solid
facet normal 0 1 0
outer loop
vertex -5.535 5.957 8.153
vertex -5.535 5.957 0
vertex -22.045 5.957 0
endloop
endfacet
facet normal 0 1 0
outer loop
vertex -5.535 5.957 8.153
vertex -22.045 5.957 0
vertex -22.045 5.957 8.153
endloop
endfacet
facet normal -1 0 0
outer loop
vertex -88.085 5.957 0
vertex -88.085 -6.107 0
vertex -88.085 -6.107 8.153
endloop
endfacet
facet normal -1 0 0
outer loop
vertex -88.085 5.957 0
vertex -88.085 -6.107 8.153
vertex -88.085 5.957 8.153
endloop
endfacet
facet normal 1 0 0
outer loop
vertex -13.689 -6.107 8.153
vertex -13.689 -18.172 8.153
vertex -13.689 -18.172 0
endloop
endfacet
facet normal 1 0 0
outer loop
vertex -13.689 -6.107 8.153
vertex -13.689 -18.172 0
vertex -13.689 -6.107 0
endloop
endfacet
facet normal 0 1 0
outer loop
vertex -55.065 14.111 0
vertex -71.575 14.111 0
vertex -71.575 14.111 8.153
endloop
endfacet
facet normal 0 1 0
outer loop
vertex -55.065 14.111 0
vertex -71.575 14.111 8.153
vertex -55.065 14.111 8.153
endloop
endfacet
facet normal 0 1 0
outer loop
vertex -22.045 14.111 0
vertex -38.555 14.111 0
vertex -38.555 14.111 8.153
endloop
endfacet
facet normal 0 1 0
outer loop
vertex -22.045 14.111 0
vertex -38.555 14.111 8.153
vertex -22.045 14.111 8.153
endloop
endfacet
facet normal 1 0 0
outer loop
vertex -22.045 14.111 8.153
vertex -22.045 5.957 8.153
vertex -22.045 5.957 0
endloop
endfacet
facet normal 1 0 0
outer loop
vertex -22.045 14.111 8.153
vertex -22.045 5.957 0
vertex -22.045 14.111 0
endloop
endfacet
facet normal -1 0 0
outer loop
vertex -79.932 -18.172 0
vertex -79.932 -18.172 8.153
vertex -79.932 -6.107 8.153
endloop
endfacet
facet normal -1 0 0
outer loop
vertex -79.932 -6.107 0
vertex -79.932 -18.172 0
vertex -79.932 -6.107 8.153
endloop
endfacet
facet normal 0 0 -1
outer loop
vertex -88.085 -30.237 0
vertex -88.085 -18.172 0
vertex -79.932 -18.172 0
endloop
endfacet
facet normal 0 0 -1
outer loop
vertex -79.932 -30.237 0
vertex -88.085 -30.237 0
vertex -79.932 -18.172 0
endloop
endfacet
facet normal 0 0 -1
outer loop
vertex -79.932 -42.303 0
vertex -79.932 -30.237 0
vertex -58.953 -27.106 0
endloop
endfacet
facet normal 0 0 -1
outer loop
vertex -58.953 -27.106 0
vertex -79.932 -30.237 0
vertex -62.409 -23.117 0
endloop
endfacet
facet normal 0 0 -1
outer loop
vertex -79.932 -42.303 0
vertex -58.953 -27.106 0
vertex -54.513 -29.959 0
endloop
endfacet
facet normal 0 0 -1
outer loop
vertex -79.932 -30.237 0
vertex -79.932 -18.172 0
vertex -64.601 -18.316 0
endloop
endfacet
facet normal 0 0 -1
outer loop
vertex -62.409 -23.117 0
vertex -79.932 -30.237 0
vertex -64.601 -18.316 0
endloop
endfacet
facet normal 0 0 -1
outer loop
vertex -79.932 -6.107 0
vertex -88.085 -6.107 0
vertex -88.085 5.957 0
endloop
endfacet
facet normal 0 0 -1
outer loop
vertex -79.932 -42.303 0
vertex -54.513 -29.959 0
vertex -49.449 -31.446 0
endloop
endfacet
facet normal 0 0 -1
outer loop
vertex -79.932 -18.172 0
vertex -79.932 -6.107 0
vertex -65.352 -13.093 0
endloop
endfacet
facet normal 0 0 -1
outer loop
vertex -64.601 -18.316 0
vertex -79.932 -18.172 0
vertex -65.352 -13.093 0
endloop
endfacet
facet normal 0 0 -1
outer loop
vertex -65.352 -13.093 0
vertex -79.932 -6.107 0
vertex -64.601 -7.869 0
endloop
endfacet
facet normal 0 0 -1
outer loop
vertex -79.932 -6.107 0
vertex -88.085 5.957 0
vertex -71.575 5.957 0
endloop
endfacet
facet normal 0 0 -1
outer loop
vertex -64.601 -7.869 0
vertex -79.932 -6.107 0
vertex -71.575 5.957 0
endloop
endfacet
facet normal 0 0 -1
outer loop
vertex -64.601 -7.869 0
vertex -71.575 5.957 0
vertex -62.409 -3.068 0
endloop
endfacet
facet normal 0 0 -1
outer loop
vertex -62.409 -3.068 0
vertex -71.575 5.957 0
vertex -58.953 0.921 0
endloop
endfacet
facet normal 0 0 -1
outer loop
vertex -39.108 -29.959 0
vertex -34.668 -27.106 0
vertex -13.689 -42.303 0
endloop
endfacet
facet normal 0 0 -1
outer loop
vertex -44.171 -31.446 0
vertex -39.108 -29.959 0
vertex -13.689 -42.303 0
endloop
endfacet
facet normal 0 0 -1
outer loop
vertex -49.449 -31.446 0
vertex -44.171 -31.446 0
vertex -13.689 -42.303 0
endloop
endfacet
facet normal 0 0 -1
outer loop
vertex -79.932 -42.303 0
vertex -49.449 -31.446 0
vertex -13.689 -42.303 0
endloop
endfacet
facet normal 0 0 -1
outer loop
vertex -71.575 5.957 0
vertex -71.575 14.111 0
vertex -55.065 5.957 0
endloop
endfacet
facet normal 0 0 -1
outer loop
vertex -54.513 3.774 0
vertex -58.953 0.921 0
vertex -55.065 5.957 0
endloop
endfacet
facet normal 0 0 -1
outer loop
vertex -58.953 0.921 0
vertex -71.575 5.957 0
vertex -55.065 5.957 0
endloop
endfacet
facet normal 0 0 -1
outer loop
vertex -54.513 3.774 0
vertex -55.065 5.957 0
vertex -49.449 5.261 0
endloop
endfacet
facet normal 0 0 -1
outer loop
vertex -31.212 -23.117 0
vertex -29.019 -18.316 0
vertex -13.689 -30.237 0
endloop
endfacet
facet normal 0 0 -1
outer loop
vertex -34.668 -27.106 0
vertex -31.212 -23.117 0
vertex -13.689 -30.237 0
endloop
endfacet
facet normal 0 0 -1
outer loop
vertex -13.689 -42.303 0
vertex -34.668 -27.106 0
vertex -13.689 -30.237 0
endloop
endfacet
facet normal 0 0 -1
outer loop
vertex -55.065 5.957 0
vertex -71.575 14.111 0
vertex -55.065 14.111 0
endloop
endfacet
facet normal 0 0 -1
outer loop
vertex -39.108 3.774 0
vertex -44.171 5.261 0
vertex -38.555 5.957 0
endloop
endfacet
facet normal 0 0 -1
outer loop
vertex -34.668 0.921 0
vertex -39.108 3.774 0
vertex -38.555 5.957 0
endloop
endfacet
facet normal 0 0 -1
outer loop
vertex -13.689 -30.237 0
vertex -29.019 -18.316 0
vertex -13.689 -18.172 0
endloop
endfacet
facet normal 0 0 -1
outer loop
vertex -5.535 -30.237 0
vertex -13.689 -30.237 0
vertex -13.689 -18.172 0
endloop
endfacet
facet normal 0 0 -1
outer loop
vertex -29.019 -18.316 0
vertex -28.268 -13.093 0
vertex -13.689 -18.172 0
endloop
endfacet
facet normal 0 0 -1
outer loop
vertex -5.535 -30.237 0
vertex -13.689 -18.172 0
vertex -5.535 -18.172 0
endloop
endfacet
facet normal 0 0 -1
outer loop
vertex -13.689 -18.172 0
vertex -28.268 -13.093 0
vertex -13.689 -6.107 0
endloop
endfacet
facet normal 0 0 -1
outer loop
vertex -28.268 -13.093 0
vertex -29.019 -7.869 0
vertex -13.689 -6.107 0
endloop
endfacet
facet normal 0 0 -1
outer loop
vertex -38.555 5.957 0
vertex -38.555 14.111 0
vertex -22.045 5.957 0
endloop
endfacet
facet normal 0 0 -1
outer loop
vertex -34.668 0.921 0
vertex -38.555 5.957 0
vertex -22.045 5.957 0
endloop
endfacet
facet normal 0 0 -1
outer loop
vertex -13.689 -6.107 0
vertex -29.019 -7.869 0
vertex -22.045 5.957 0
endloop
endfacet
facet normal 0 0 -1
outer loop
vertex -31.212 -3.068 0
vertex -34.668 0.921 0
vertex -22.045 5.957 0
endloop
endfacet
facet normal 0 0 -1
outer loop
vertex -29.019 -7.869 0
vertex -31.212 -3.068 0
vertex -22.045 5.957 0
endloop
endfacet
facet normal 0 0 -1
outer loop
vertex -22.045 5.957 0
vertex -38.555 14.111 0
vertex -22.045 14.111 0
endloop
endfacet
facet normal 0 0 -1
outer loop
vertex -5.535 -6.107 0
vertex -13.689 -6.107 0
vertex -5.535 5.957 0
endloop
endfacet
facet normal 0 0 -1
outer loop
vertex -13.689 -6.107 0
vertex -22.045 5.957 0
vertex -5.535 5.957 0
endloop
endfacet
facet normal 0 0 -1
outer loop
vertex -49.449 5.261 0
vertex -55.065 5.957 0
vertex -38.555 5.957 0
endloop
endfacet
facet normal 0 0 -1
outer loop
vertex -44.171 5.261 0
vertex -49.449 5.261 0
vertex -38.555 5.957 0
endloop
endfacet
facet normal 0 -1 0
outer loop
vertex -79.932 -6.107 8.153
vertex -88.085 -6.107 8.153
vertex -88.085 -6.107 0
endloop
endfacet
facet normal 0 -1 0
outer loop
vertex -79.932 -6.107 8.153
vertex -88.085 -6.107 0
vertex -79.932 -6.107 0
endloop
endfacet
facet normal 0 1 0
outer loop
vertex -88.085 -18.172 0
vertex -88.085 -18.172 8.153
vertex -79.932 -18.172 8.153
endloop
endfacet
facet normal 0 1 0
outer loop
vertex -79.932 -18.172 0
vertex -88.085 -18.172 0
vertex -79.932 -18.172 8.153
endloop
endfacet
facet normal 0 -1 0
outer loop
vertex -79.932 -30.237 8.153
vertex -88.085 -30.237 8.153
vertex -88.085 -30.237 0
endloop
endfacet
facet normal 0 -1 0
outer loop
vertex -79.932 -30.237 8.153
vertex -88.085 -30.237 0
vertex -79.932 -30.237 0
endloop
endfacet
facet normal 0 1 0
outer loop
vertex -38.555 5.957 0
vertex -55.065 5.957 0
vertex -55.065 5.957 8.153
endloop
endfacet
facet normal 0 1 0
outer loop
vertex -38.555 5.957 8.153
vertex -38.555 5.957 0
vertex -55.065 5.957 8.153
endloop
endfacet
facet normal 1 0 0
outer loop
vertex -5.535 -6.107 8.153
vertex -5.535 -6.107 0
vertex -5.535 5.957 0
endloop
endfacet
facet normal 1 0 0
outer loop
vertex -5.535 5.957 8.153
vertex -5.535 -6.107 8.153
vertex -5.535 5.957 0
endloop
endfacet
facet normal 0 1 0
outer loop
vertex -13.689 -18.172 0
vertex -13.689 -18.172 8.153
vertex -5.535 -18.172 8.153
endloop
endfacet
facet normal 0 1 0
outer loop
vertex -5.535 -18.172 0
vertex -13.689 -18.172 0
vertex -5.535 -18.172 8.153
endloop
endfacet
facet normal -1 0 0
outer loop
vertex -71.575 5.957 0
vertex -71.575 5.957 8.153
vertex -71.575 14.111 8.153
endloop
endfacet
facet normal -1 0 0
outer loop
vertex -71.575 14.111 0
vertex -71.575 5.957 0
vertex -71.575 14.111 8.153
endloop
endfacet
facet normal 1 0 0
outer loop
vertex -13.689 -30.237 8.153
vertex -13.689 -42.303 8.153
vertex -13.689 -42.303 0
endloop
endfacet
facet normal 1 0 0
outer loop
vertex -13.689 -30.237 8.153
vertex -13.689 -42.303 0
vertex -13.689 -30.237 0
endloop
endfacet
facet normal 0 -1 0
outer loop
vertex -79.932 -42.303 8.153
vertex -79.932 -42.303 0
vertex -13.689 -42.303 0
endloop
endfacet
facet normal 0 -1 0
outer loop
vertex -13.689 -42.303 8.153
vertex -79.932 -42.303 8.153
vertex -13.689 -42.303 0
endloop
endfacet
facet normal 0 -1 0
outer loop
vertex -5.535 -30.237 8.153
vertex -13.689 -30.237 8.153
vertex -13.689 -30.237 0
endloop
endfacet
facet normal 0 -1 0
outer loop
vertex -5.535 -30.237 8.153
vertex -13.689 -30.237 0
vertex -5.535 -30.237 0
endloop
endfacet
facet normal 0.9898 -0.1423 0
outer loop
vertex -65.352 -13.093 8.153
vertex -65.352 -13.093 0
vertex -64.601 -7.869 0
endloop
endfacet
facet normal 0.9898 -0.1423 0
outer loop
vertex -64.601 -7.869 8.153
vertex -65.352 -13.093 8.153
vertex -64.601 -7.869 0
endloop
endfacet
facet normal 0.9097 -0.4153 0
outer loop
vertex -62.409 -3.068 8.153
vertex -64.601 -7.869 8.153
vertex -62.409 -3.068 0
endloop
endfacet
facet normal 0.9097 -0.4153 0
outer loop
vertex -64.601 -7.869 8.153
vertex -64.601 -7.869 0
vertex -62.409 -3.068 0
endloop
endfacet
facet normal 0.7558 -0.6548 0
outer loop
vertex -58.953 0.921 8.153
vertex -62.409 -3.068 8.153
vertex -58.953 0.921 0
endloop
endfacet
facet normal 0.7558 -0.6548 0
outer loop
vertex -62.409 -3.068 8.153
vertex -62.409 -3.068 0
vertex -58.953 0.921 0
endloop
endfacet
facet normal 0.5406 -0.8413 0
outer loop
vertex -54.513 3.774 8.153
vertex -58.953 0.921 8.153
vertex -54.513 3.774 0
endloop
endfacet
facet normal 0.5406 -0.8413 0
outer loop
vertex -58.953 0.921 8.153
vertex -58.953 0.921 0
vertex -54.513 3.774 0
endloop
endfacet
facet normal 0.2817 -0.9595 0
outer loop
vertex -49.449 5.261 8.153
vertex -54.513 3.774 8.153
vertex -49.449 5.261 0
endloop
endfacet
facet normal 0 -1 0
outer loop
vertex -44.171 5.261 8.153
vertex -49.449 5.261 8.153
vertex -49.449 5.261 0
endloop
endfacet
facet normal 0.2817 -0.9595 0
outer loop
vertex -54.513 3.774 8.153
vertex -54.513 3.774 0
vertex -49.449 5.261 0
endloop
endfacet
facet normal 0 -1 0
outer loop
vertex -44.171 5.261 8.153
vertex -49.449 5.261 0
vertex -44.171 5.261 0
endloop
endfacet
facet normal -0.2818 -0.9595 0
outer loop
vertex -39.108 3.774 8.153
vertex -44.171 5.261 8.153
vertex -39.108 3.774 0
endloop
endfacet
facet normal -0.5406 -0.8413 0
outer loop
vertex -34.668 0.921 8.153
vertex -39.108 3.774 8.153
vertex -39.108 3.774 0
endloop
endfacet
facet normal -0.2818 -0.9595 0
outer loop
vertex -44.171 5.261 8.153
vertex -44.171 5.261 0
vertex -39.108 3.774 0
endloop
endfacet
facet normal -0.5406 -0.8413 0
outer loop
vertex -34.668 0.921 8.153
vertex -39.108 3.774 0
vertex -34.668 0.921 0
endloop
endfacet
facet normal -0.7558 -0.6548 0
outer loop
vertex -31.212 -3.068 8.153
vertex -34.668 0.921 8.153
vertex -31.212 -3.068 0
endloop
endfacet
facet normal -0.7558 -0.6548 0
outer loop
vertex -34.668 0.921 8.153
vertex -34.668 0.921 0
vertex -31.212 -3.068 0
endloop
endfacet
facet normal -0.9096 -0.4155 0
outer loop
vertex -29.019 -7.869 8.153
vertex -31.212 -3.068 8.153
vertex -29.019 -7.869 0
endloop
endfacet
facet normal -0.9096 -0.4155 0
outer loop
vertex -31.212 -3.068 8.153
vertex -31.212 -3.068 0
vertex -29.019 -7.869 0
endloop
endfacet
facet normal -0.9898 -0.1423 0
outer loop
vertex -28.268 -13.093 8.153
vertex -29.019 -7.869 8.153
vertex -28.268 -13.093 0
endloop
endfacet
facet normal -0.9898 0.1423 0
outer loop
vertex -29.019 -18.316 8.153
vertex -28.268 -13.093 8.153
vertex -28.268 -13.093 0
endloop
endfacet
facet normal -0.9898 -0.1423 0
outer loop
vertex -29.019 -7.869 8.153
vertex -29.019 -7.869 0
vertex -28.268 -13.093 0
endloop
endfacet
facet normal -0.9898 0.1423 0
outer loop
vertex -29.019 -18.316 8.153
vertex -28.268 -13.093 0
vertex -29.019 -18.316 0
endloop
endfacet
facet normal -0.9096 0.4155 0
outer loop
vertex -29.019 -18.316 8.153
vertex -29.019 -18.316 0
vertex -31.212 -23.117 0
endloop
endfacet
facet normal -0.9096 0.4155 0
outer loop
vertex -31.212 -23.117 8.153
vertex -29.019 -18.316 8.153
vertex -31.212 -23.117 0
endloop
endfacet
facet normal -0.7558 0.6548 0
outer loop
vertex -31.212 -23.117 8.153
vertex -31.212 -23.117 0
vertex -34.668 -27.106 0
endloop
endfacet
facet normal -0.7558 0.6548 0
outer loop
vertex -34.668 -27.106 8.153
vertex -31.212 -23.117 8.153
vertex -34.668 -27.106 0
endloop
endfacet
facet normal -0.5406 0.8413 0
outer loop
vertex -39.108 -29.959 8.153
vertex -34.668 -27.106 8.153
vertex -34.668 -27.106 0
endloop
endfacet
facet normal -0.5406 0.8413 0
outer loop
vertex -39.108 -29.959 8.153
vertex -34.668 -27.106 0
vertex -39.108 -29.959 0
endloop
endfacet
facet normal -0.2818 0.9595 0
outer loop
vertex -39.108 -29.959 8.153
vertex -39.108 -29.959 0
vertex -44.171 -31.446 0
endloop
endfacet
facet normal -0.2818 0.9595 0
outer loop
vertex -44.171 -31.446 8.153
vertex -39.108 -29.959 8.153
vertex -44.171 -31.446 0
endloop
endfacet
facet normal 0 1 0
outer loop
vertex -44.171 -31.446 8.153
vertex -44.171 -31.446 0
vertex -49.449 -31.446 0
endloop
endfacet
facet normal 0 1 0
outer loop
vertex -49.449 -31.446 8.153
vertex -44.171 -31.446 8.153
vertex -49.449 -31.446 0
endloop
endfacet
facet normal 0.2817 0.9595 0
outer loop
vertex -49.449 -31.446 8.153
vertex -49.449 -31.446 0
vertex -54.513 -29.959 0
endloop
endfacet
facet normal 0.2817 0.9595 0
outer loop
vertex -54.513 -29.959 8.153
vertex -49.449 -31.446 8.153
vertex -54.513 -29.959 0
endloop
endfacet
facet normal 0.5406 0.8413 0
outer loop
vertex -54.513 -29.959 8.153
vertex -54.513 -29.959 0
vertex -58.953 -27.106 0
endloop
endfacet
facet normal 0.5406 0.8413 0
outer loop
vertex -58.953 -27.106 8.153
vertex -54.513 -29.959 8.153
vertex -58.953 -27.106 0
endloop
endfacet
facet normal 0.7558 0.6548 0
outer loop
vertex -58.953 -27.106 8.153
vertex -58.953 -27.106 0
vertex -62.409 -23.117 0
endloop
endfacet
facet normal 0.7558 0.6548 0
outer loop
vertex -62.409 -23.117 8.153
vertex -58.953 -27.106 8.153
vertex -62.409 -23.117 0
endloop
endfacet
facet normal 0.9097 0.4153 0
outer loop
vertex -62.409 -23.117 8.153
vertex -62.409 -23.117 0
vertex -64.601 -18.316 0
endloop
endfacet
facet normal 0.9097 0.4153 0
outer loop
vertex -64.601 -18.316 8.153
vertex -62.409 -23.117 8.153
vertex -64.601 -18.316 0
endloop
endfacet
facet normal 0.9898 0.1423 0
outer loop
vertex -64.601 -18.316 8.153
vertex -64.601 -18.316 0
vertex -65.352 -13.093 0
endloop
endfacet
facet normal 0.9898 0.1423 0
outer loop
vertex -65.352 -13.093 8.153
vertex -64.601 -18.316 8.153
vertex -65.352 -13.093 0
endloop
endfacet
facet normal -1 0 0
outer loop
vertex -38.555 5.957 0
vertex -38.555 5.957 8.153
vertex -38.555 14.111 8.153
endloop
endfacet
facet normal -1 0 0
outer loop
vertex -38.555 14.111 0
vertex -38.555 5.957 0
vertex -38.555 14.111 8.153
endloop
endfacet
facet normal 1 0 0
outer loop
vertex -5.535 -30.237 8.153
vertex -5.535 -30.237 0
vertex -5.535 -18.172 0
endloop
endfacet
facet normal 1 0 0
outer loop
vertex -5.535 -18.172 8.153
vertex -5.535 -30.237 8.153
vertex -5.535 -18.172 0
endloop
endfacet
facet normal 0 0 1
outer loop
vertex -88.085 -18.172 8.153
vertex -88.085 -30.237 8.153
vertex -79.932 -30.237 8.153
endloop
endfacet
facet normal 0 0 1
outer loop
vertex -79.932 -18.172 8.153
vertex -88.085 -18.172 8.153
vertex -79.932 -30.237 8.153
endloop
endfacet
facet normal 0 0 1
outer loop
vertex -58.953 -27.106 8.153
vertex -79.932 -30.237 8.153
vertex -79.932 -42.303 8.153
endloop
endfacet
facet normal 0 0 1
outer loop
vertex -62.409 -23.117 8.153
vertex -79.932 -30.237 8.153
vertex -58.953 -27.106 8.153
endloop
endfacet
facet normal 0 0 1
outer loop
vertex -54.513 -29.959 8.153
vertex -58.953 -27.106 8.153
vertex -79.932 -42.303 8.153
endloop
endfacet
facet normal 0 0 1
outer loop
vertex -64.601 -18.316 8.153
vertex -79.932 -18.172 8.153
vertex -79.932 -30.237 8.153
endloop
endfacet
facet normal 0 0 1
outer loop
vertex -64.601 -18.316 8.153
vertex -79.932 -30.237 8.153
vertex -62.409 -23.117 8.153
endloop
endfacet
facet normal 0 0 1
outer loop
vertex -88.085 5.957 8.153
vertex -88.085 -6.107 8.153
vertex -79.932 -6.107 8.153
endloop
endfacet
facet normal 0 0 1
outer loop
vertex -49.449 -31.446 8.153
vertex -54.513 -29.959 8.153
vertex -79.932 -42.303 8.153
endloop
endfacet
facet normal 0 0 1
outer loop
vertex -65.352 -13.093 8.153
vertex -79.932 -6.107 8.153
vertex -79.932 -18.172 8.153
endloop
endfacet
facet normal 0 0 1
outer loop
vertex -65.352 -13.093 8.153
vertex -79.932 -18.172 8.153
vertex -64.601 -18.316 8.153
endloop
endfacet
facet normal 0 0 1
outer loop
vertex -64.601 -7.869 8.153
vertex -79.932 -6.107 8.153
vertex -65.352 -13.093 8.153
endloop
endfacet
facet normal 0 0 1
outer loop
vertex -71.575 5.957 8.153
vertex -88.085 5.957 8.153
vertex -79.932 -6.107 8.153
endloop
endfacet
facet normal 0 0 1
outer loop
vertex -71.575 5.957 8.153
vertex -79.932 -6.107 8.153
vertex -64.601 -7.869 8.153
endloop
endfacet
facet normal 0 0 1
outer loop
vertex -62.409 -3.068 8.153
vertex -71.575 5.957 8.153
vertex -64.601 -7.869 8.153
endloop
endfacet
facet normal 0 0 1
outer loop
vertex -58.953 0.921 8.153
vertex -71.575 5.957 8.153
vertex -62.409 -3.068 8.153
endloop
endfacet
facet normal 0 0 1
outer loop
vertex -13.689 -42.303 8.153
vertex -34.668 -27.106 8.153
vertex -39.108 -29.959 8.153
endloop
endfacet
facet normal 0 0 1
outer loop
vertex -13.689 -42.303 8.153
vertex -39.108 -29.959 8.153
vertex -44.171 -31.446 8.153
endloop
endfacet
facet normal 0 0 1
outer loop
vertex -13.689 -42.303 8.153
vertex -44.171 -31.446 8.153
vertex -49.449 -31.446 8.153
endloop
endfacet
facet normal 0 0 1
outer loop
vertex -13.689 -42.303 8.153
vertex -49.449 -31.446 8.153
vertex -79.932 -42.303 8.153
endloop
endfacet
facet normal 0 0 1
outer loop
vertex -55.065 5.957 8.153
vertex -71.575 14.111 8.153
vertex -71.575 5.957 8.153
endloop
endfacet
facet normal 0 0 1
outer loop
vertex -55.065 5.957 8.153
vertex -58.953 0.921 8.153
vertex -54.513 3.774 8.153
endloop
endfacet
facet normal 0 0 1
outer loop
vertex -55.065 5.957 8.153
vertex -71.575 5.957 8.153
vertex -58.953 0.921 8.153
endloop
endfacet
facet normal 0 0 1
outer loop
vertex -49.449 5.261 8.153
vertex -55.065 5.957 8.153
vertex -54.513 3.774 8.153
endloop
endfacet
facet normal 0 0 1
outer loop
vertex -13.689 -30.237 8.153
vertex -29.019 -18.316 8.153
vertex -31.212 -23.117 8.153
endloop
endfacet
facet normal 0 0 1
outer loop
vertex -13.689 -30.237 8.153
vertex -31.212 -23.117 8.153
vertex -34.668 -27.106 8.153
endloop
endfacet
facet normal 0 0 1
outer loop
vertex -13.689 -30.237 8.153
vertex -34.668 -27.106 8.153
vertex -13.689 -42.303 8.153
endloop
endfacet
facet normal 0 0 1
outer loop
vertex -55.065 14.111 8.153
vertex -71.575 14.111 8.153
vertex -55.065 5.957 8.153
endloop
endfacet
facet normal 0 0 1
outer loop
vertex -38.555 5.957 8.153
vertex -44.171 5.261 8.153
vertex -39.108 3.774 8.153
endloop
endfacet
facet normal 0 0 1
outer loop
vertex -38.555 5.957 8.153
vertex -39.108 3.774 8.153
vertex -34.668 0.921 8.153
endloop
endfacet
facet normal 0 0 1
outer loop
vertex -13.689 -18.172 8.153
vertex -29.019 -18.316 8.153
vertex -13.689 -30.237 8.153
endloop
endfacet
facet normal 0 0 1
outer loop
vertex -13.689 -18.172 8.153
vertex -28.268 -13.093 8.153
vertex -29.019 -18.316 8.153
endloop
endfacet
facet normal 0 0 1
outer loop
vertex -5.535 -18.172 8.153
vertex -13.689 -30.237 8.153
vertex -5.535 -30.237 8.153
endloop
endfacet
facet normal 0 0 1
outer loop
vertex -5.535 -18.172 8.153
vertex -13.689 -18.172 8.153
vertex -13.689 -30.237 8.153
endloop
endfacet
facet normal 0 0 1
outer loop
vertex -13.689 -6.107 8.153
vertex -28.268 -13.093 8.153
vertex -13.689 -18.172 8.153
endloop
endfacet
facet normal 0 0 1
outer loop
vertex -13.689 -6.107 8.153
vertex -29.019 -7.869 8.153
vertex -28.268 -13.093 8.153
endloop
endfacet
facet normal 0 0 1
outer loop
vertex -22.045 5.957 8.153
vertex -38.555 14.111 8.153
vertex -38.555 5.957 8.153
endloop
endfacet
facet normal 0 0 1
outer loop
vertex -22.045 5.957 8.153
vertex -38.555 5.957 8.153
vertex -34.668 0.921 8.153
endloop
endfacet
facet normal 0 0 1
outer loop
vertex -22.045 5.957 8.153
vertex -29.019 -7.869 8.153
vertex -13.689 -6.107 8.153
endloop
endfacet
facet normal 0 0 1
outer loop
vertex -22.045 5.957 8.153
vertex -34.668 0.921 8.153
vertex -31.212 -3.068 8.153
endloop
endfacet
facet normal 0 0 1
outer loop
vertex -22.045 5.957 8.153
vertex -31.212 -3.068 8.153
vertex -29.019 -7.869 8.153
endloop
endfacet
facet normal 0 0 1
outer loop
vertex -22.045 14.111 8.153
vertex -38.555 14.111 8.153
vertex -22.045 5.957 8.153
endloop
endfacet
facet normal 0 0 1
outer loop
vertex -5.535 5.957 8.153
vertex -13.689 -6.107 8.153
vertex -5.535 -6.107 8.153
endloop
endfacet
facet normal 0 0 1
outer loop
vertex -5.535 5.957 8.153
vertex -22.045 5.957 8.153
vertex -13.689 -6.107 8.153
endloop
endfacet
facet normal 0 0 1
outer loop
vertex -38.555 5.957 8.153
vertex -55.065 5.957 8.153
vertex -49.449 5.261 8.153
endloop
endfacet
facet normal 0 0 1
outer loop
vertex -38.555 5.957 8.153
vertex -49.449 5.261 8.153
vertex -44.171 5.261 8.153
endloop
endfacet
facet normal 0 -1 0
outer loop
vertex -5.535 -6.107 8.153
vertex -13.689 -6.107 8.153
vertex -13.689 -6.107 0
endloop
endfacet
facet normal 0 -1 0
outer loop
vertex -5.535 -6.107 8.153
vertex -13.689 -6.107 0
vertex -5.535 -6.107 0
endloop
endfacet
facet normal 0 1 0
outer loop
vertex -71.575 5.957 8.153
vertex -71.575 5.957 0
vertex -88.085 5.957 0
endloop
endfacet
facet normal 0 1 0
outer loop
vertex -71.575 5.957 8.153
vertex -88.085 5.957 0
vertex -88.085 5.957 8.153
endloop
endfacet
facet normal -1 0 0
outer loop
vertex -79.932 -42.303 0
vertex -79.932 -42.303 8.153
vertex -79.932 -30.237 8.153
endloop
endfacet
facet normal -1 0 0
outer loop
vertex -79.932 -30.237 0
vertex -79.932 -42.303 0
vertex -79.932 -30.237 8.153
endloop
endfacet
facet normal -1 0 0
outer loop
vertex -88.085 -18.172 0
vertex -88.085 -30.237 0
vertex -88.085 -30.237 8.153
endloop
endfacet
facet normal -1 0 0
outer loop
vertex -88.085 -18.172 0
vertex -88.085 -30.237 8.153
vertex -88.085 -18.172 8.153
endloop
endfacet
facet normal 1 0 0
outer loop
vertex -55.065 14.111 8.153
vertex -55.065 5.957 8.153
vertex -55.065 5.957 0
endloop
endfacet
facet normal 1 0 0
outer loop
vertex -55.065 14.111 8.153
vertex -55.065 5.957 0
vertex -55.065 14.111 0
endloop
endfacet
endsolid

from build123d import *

# Parameters (mm, degrees)
SKETCH1_W                = 82.55
SKETCH1_H                = 56.4134
BOSS_EXTRUDE1_DEPTH      = 8.1534
CUT_EXTRUDE1_START       = -88.085249325
CUT_EXTRUDE1_OUTLINE_W   = 8.1534
CUT_EXTRUDE1_OUTLINE_H   = 8.1534
CUT_EXTRUDE1_DEPTH       = 16.51
CUT_EXTRUDE1_START_2     = -55.065249325
CUT_EXTRUDE1_2_OUTLINE_W = 8.1534
CUT_EXTRUDE1_2_OUTLINE_H = 8.1534
CUT_EXTRUDE1_2_DEPTH     = 16.51
CUT_EXTRUDE1_START_3     = -22.045249325
CUT_EXTRUDE1_3_OUTLINE_W = 8.1534
CUT_EXTRUDE1_3_OUTLINE_H = 8.1534
CUT_EXTRUDE1_3_DEPTH     = 16.51
SKETCH3_W                = 8.1534
SKETCH3_H                = 12.065106948
CUT_EXTRUDE2_DEPTH       = 99.056076844
SKETCH4_R                = 18.542
CUT_EXTRUDE3_DEPTH       = 99.056076844


# Read off the part's stored shape, not the designer's step: Cut-Extrude1
with BuildPart() as part:
    # Sketch1 → Boss-Extrude1 (new body)
    with BuildSketch(Plane.XY):
        with Locations((-46.810249325, -14.095842782)):
            Rectangle(SKETCH1_W, SKETCH1_H)
    extrude(amount=BOSS_EXTRUDE1_DEPTH)

    # Cut-Extrude1 outline → Cut-Extrude1 (cut)
    with BuildSketch(Plane.YZ.offset(CUT_EXTRUDE1_START)):
        with Locations((10.034157218, 4.0767)):
            Rectangle(CUT_EXTRUDE1_OUTLINE_W, CUT_EXTRUDE1_OUTLINE_H)
    extrude(amount=CUT_EXTRUDE1_DEPTH, mode=Mode.SUBTRACT)

    # Cut-Extrude1 2 outline → Cut-Extrude1 2 (cut)
    with BuildSketch(Plane.YZ.offset(CUT_EXTRUDE1_START_2)):
        with Locations((10.034157218, 4.0767)):
            Rectangle(CUT_EXTRUDE1_2_OUTLINE_W, CUT_EXTRUDE1_2_OUTLINE_H)
    extrude(amount=CUT_EXTRUDE1_2_DEPTH, mode=Mode.SUBTRACT)

    # Cut-Extrude1 3 outline → Cut-Extrude1 3 (cut)
    with BuildSketch(Plane.YZ.offset(CUT_EXTRUDE1_START_3)):
        with Locations((10.034157218, 4.0767)):
            Rectangle(CUT_EXTRUDE1_3_OUTLINE_W, CUT_EXTRUDE1_3_OUTLINE_H)
    extrude(amount=CUT_EXTRUDE1_3_DEPTH, mode=Mode.SUBTRACT)

    # Sketch3 → Cut-Extrude2 (cut, through all)
    with BuildSketch(Plane.XY.offset(8.1534)):
        with Locations((-84.008549325, -36.269989308)):
            Rectangle(SKETCH3_W, SKETCH3_H)
        with Locations((-84.008549325, -12.139775411)):
            Rectangle(SKETCH3_W, SKETCH3_H)
        with Locations((-9.611949325, -36.269989308)):
            Rectangle(SKETCH3_W, SKETCH3_H)
        with Locations((-9.611949325, -12.139775411)):
            Rectangle(SKETCH3_W, SKETCH3_H)
    extrude(amount=-CUT_EXTRUDE2_DEPTH, mode=Mode.SUBTRACT)

    # Sketch4 → Cut-Extrude3 (cut, through all)
    with BuildSketch(Plane(origin=(0, 0, 0), x_dir=(-1, 0, 0), z_dir=(0, 0, -1))):
        with Locations((46.810249325, -13.092542782)):
            Circle(SKETCH4_R)
    extrude(amount=-CUT_EXTRUDE3_DEPTH, mode=Mode.SUBTRACT)


solid = part.part
